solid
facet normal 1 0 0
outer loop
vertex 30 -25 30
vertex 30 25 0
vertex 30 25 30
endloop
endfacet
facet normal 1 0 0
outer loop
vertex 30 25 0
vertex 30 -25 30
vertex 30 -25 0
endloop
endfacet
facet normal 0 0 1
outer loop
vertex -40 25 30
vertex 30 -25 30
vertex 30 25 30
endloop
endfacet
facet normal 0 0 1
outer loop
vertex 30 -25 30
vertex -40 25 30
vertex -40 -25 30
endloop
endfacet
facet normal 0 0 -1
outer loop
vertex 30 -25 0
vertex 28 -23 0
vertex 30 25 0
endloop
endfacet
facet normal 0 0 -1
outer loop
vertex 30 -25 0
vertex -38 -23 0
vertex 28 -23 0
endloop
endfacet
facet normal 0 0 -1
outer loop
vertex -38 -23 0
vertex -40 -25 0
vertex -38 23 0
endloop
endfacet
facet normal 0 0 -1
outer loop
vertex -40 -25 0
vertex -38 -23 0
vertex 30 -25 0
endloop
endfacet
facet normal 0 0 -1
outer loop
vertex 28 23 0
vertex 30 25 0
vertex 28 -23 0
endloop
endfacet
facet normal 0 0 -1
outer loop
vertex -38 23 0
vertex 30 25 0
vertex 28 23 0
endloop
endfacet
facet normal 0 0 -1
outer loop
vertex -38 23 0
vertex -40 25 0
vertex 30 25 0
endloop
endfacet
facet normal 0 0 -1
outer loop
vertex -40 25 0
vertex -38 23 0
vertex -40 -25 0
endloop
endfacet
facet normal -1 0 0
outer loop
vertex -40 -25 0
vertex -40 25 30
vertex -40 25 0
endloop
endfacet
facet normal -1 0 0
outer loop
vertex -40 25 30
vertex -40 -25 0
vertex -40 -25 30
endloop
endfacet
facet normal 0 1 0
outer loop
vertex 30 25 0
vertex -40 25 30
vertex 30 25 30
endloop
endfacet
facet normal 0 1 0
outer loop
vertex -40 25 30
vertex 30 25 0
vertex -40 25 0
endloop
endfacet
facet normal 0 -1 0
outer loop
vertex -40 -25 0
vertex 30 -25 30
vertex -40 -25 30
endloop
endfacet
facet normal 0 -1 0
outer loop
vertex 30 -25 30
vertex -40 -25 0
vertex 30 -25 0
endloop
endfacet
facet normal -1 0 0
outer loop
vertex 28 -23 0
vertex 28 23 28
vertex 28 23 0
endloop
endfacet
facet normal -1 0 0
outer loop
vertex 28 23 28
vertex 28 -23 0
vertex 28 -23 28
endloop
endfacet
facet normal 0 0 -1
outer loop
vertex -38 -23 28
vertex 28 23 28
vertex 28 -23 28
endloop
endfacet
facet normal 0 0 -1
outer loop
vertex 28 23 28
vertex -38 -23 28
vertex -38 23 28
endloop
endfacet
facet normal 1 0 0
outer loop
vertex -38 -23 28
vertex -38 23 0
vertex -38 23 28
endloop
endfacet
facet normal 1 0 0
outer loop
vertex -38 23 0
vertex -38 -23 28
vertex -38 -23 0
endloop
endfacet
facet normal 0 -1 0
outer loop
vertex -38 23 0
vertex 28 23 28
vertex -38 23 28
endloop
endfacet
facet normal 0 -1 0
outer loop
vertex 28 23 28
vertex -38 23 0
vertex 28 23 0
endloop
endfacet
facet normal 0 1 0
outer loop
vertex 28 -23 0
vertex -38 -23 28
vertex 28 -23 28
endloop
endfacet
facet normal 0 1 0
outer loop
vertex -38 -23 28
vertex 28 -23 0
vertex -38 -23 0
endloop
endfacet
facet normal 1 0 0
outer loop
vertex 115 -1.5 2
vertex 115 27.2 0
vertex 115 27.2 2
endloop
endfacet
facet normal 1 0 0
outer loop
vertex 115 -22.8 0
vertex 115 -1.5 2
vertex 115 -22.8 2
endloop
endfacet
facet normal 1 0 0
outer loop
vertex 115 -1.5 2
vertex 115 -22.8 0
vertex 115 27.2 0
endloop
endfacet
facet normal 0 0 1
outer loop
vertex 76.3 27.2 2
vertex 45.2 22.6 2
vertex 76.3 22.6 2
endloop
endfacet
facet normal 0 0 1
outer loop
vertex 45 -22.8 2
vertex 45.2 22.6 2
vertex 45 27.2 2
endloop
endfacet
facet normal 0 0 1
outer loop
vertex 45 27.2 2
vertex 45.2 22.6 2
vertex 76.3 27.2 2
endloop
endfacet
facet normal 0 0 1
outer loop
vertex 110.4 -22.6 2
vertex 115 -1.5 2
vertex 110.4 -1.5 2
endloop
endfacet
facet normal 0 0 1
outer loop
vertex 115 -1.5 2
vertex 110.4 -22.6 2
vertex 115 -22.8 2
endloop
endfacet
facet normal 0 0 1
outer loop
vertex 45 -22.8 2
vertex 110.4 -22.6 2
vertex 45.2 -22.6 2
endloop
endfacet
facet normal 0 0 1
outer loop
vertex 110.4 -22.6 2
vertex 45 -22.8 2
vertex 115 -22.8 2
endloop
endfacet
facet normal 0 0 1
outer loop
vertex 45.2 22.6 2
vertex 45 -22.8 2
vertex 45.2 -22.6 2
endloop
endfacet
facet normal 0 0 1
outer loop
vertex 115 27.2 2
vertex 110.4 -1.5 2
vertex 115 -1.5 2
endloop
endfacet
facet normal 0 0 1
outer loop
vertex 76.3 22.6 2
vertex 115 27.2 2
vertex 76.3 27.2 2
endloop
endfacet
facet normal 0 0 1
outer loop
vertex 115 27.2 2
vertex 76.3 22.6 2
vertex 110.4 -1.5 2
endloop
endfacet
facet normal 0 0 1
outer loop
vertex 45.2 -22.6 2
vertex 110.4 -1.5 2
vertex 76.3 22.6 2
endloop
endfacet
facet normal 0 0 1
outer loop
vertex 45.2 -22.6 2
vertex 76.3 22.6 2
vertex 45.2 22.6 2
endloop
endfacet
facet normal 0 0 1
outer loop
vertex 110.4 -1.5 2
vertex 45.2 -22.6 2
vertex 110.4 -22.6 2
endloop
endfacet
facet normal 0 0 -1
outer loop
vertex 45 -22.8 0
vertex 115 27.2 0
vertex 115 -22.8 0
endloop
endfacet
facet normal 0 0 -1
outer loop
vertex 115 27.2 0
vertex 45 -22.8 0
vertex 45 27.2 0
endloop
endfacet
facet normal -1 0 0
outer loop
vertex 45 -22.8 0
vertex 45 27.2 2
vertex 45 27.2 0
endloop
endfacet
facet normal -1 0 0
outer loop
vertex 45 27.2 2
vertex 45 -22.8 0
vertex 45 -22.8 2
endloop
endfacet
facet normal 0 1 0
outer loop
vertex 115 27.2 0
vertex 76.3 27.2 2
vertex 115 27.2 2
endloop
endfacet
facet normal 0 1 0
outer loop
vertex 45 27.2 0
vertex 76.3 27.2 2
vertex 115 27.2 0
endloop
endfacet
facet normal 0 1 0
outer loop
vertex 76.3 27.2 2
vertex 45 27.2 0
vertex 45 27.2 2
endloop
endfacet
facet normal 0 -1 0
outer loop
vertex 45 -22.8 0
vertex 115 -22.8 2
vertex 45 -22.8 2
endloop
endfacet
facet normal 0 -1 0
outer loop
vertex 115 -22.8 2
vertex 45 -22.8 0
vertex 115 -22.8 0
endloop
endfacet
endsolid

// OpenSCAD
// Two-part enclosure for small electronics board
// Part 1: Box (left)
// Part 2: Lid (right, printed upside down)
// Prints together with a 10 mm gap.

// --- Dimensions ---
// Box Outer Dimensions (X x Y x Z)
$box_outer_x = 70;
$box_outer_y = 50;
$box_outer_z = 30;

// Wall and Floor Thickness
$wall_thickness = 2;
$floor_thickness = 2;

// Lid Dimensions
// Plate thickness
$plate_thickness = 2;
// Lip dimensions (height and wall thickness)
$lip_height = 4;
$lip_wall_thickness = 1.5;
// Lip outer size (X x Y)
$lip_outer_x = 65.6;
$lip_outer_y = 45.6;

// Clearance
$clearance = 0.2;

// Gap between parts
$gap = 10;

// --- Configuration ---
// Set global resolution for curved shapes
$fn = 64;

// --- Part 1: The Box ---
// Position: Centered on its own footprint, then shifted left by half gap
// Footprint: $box_outer_x * $box_outer_y
translate([-($gap/2) - ($box_outer_x/2), -($box_outer_y/2), 0])
difference() {
    // Outer Box
    cube([
        $box_outer_x, 
        $box_outer_y, 
        $box_outer_z
    ]);
    
    // Inner Void (to create walls and floor)
    // Inner X = Outer X - 2*Wall
    // Inner Y = Outer Y - 2*Wall
    // Inner Z = Outer Z - Floor (Top is open)
    translate([
        $wall_thickness, 
        $wall_thickness, 
        0
    ])
    cube([
        $box_outer_x - (2 * $wall_thickness),
        $box_outer_y - (2 * $wall_thickness),
        $box_outer_z - $floor_thickness
    ]);
}

// --- Part 2: The Lid ---
// Position: Centered on its own footprint, then shifted right by half gap + box width
// Footprint: $lip_outer_x * $lip_outer_y
// The user requested the lid to be printed "upside down" relative to the box opening logic,
// but physically it is a plate on the bed with a lip sticking UP.
// To print "upside down" in the sense of the lid covering the box, the lip must face UP.
// If the user meant the part geometry is inverted (lip facing down), it wouldn't cover the box.
// Assuming standard enclosure logic: Plate on bed, Lip goes up into the box.
// "Printed upside down" likely refers to the orientation of the part relative to the box (it's the top part).
// We place it on the +X side.

translate([
    $gap + ($box_outer_x/2), 
    -($lip_outer_y/2), 
    0
])
difference() {
    // 1. The Main Plate (70x50x2)
    // The user said "plate 70 x 50 x 2 mm". 
    // However, the lip outer size is 65.6 x 45.6. 
    // If the plate is 70x50, the lip (65.6x45.6) is smaller and centered.
    // This creates a rim around the lip.
    cube([
        $box_outer_x, // 70
        $box_outer_y, // 50
        $plate_thickness // 2
    ]);
    
    // 2. The Lip Void
    // We need to remove the material inside the lip dimensions to create the hole.
    // Lip Outer: 65.6 x 45.6
    // Lip Wall: 1.5
    // Lip Height: 4
    
    // Calculate Lip Inner Dimensions
    $lip_inner_x = $lip_outer_x - (2 * $lip_wall_thickness);
    $lip_inner_y = $lip_outer_y - (2 * $lip_wall_thickness);
    
    // The void starts at Z = $plate_thickness and goes up by $lip_height
    translate([
        ($lip_outer_x/2) - $lip_wall_thickness, // Center X
        ($lip_outer_y/2) - $lip_wall_thickness, // Center Y
        $plate_thickness // Start at top of plate
    ])
    cube([
        $lip_inner_x,
        $lip_inner_y,
        $lip_height
    ]);
    
    // 3. Cut the Lip Wall Material (to make the hole round/clean and ensure fit)
    // We cut a shape slightly larger than the inner lip dimensions to ensure the 0.2mm clearance is respected
    // and the hole is clean.
    // Target inner size for the hole: Lip Outer - 2*Clearance
    $cut_x = $lip_outer_x - (2 * $clearance);
    $cut_y = $lip_outer_y - (2 * $clearance);
    
    translate([
        ($lip_outer_x/2) - ($cut_x/2),
        ($lip_outer_y/2) - ($cut_y/2),
        $plate_thickness
    ])
    cube([
        $cut_x,
        $cut_y,
        $lip_height + 0.1 // Extend slightly past lip height to ensure clean cut
    ]);
}
